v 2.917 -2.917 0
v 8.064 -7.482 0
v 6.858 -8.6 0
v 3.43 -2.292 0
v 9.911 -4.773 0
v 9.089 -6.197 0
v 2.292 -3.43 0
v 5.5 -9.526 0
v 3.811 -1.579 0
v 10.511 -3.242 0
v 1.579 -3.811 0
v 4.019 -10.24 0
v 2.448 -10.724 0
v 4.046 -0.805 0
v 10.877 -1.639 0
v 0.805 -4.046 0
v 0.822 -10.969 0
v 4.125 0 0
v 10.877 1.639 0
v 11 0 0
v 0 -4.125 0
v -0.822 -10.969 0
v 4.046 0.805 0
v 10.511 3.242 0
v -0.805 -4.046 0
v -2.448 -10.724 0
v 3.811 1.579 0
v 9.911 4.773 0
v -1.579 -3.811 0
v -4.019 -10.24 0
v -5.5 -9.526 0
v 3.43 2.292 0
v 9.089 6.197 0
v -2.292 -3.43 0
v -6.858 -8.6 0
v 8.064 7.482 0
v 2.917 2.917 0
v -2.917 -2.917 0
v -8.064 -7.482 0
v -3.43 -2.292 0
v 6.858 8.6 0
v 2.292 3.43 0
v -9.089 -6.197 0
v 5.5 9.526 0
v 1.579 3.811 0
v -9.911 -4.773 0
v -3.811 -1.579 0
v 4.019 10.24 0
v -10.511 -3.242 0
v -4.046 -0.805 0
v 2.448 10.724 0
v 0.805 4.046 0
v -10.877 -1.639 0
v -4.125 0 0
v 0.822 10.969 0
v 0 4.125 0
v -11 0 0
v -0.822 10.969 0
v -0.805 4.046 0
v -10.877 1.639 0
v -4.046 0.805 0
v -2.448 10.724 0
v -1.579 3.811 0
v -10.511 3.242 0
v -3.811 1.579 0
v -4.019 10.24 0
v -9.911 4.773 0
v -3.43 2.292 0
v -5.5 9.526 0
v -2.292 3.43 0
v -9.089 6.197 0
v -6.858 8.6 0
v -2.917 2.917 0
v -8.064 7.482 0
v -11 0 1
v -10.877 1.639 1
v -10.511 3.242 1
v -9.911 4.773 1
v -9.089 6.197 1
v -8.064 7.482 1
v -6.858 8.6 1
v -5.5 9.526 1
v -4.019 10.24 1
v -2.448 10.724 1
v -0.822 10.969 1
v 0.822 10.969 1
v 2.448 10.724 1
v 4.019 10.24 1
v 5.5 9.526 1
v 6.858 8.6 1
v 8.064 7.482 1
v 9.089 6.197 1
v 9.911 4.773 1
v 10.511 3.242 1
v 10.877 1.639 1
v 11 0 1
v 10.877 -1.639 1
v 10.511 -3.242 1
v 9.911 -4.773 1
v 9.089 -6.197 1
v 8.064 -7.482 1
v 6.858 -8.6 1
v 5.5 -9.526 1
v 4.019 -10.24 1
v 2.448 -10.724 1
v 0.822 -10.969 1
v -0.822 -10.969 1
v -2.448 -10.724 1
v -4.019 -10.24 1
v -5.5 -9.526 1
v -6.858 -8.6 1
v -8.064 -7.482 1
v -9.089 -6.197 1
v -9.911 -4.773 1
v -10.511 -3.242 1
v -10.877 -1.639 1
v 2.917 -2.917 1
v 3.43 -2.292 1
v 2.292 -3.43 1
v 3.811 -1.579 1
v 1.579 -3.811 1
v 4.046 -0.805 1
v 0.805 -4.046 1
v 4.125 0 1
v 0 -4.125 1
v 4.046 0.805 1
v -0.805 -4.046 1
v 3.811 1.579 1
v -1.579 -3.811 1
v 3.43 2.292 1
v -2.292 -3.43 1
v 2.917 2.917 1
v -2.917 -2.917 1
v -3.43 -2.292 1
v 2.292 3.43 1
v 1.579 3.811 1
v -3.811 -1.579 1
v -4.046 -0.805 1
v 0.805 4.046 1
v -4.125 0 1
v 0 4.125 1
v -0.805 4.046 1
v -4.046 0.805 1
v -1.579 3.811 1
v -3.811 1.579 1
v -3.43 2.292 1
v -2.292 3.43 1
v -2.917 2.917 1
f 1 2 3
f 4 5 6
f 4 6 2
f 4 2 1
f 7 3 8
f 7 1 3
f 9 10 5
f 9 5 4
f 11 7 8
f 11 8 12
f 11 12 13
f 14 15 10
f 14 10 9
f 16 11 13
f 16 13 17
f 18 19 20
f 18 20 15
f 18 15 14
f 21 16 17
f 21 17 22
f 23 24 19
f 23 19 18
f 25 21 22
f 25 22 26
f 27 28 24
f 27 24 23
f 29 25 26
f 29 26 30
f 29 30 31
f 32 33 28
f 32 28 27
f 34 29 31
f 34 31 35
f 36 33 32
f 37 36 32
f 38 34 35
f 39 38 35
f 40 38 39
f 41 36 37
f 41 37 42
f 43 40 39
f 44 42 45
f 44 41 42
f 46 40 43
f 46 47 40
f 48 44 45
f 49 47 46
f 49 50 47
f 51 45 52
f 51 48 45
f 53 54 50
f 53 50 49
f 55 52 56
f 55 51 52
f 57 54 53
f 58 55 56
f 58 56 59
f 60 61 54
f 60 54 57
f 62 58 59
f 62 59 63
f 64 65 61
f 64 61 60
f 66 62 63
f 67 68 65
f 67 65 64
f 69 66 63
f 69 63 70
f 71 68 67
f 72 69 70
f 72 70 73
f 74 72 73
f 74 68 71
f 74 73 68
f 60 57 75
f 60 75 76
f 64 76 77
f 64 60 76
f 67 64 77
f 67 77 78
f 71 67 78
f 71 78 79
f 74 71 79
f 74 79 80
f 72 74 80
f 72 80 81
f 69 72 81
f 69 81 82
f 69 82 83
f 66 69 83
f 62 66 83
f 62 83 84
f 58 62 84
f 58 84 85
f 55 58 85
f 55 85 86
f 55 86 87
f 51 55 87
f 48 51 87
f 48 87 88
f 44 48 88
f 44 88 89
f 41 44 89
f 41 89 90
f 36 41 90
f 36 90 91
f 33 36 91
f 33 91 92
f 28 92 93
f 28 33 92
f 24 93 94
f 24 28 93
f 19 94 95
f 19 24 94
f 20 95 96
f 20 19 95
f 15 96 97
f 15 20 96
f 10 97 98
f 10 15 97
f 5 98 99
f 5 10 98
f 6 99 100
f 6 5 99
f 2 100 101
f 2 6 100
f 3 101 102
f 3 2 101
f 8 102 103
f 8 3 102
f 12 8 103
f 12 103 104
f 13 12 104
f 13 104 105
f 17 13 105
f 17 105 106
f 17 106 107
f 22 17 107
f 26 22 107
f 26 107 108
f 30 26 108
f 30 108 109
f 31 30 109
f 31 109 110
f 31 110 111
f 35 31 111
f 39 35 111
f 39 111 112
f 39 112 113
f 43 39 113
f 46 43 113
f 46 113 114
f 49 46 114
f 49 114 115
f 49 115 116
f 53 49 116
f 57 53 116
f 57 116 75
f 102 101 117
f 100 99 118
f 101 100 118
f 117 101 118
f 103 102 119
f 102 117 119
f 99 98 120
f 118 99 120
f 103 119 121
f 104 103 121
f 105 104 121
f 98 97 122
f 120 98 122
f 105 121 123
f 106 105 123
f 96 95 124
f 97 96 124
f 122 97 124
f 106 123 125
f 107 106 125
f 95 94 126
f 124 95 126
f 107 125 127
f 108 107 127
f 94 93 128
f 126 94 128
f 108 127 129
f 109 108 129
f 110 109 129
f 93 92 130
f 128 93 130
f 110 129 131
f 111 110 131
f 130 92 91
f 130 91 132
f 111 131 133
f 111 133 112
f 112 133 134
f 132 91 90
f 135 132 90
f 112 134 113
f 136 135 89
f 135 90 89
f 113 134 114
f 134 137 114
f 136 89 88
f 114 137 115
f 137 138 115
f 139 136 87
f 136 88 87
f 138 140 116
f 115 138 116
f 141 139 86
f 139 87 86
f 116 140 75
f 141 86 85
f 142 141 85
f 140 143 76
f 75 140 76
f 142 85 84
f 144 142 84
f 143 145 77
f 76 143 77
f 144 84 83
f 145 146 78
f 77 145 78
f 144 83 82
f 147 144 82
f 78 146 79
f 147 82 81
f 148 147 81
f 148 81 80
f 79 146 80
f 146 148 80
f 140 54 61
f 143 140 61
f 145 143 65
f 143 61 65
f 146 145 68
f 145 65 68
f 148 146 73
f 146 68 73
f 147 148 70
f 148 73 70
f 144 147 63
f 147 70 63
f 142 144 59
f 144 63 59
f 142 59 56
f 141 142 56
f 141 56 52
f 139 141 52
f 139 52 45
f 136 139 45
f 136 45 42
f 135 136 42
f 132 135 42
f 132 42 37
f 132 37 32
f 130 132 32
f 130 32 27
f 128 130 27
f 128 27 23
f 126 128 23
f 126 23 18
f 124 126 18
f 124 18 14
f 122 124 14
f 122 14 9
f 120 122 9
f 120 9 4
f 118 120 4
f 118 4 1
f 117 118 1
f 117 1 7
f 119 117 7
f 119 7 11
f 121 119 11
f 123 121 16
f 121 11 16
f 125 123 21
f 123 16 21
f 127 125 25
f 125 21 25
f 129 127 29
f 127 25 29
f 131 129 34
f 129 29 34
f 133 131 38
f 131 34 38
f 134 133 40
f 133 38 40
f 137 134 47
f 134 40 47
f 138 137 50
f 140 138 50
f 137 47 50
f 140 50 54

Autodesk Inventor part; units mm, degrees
ref_plane "YZ Plane" through (0, 0, 0) normal (1, 0, 0) x (0, 1, 0)
ref_plane "XZ Plane" through (0, 0, 0) normal (0, 1, 0) x (-1, 0, 0)
ref_plane "XY Plane" through (0, 0, 0) normal (0, 0, 1) x (1, 0, 0)
sketch "スケッチ1" plane through (0, 0, 0) normal (0, 0, 1) x (1, 0, 0)
  circle A0 centre (0, 0) radius 3.125
  circle A1 centre (0, 0) radius 6
  dimension "d0" = 6.25
  dimension "d1" = 12
extrude "押し出し1" add sketch "スケッチ1" along normal blind 1
sketch "스케치2" plane through (0, 0, 0) normal (0, 0, -1) x (-1, 0, 0)
  circle A0 centre (0, 0) radius 6 projected
  circle A1 centre (0, 0) radius 3.125 projected
  circle A2 centre (0, 0) radius 4.125
  dimension "d4" = 8.25
extrude "돌출2" cut sketch "스케치2" against normal through all contours A2
sketch "스케치3" plane through (0, 0, 0) normal (0, 0, -1) x (-1, 0, 0)
  circle A0 centre (0, 0) radius 4.125 projected
  circle A1 centre (0, 0) radius 6 projected
  circle A2 centre (0, 0) radius 11
  dimension "d7" = 22
extrude "돌출3" add sketch "스케치3" against normal blind 1 contours A2
properties part number "TT-0822-10" material "PET プラスチック"
